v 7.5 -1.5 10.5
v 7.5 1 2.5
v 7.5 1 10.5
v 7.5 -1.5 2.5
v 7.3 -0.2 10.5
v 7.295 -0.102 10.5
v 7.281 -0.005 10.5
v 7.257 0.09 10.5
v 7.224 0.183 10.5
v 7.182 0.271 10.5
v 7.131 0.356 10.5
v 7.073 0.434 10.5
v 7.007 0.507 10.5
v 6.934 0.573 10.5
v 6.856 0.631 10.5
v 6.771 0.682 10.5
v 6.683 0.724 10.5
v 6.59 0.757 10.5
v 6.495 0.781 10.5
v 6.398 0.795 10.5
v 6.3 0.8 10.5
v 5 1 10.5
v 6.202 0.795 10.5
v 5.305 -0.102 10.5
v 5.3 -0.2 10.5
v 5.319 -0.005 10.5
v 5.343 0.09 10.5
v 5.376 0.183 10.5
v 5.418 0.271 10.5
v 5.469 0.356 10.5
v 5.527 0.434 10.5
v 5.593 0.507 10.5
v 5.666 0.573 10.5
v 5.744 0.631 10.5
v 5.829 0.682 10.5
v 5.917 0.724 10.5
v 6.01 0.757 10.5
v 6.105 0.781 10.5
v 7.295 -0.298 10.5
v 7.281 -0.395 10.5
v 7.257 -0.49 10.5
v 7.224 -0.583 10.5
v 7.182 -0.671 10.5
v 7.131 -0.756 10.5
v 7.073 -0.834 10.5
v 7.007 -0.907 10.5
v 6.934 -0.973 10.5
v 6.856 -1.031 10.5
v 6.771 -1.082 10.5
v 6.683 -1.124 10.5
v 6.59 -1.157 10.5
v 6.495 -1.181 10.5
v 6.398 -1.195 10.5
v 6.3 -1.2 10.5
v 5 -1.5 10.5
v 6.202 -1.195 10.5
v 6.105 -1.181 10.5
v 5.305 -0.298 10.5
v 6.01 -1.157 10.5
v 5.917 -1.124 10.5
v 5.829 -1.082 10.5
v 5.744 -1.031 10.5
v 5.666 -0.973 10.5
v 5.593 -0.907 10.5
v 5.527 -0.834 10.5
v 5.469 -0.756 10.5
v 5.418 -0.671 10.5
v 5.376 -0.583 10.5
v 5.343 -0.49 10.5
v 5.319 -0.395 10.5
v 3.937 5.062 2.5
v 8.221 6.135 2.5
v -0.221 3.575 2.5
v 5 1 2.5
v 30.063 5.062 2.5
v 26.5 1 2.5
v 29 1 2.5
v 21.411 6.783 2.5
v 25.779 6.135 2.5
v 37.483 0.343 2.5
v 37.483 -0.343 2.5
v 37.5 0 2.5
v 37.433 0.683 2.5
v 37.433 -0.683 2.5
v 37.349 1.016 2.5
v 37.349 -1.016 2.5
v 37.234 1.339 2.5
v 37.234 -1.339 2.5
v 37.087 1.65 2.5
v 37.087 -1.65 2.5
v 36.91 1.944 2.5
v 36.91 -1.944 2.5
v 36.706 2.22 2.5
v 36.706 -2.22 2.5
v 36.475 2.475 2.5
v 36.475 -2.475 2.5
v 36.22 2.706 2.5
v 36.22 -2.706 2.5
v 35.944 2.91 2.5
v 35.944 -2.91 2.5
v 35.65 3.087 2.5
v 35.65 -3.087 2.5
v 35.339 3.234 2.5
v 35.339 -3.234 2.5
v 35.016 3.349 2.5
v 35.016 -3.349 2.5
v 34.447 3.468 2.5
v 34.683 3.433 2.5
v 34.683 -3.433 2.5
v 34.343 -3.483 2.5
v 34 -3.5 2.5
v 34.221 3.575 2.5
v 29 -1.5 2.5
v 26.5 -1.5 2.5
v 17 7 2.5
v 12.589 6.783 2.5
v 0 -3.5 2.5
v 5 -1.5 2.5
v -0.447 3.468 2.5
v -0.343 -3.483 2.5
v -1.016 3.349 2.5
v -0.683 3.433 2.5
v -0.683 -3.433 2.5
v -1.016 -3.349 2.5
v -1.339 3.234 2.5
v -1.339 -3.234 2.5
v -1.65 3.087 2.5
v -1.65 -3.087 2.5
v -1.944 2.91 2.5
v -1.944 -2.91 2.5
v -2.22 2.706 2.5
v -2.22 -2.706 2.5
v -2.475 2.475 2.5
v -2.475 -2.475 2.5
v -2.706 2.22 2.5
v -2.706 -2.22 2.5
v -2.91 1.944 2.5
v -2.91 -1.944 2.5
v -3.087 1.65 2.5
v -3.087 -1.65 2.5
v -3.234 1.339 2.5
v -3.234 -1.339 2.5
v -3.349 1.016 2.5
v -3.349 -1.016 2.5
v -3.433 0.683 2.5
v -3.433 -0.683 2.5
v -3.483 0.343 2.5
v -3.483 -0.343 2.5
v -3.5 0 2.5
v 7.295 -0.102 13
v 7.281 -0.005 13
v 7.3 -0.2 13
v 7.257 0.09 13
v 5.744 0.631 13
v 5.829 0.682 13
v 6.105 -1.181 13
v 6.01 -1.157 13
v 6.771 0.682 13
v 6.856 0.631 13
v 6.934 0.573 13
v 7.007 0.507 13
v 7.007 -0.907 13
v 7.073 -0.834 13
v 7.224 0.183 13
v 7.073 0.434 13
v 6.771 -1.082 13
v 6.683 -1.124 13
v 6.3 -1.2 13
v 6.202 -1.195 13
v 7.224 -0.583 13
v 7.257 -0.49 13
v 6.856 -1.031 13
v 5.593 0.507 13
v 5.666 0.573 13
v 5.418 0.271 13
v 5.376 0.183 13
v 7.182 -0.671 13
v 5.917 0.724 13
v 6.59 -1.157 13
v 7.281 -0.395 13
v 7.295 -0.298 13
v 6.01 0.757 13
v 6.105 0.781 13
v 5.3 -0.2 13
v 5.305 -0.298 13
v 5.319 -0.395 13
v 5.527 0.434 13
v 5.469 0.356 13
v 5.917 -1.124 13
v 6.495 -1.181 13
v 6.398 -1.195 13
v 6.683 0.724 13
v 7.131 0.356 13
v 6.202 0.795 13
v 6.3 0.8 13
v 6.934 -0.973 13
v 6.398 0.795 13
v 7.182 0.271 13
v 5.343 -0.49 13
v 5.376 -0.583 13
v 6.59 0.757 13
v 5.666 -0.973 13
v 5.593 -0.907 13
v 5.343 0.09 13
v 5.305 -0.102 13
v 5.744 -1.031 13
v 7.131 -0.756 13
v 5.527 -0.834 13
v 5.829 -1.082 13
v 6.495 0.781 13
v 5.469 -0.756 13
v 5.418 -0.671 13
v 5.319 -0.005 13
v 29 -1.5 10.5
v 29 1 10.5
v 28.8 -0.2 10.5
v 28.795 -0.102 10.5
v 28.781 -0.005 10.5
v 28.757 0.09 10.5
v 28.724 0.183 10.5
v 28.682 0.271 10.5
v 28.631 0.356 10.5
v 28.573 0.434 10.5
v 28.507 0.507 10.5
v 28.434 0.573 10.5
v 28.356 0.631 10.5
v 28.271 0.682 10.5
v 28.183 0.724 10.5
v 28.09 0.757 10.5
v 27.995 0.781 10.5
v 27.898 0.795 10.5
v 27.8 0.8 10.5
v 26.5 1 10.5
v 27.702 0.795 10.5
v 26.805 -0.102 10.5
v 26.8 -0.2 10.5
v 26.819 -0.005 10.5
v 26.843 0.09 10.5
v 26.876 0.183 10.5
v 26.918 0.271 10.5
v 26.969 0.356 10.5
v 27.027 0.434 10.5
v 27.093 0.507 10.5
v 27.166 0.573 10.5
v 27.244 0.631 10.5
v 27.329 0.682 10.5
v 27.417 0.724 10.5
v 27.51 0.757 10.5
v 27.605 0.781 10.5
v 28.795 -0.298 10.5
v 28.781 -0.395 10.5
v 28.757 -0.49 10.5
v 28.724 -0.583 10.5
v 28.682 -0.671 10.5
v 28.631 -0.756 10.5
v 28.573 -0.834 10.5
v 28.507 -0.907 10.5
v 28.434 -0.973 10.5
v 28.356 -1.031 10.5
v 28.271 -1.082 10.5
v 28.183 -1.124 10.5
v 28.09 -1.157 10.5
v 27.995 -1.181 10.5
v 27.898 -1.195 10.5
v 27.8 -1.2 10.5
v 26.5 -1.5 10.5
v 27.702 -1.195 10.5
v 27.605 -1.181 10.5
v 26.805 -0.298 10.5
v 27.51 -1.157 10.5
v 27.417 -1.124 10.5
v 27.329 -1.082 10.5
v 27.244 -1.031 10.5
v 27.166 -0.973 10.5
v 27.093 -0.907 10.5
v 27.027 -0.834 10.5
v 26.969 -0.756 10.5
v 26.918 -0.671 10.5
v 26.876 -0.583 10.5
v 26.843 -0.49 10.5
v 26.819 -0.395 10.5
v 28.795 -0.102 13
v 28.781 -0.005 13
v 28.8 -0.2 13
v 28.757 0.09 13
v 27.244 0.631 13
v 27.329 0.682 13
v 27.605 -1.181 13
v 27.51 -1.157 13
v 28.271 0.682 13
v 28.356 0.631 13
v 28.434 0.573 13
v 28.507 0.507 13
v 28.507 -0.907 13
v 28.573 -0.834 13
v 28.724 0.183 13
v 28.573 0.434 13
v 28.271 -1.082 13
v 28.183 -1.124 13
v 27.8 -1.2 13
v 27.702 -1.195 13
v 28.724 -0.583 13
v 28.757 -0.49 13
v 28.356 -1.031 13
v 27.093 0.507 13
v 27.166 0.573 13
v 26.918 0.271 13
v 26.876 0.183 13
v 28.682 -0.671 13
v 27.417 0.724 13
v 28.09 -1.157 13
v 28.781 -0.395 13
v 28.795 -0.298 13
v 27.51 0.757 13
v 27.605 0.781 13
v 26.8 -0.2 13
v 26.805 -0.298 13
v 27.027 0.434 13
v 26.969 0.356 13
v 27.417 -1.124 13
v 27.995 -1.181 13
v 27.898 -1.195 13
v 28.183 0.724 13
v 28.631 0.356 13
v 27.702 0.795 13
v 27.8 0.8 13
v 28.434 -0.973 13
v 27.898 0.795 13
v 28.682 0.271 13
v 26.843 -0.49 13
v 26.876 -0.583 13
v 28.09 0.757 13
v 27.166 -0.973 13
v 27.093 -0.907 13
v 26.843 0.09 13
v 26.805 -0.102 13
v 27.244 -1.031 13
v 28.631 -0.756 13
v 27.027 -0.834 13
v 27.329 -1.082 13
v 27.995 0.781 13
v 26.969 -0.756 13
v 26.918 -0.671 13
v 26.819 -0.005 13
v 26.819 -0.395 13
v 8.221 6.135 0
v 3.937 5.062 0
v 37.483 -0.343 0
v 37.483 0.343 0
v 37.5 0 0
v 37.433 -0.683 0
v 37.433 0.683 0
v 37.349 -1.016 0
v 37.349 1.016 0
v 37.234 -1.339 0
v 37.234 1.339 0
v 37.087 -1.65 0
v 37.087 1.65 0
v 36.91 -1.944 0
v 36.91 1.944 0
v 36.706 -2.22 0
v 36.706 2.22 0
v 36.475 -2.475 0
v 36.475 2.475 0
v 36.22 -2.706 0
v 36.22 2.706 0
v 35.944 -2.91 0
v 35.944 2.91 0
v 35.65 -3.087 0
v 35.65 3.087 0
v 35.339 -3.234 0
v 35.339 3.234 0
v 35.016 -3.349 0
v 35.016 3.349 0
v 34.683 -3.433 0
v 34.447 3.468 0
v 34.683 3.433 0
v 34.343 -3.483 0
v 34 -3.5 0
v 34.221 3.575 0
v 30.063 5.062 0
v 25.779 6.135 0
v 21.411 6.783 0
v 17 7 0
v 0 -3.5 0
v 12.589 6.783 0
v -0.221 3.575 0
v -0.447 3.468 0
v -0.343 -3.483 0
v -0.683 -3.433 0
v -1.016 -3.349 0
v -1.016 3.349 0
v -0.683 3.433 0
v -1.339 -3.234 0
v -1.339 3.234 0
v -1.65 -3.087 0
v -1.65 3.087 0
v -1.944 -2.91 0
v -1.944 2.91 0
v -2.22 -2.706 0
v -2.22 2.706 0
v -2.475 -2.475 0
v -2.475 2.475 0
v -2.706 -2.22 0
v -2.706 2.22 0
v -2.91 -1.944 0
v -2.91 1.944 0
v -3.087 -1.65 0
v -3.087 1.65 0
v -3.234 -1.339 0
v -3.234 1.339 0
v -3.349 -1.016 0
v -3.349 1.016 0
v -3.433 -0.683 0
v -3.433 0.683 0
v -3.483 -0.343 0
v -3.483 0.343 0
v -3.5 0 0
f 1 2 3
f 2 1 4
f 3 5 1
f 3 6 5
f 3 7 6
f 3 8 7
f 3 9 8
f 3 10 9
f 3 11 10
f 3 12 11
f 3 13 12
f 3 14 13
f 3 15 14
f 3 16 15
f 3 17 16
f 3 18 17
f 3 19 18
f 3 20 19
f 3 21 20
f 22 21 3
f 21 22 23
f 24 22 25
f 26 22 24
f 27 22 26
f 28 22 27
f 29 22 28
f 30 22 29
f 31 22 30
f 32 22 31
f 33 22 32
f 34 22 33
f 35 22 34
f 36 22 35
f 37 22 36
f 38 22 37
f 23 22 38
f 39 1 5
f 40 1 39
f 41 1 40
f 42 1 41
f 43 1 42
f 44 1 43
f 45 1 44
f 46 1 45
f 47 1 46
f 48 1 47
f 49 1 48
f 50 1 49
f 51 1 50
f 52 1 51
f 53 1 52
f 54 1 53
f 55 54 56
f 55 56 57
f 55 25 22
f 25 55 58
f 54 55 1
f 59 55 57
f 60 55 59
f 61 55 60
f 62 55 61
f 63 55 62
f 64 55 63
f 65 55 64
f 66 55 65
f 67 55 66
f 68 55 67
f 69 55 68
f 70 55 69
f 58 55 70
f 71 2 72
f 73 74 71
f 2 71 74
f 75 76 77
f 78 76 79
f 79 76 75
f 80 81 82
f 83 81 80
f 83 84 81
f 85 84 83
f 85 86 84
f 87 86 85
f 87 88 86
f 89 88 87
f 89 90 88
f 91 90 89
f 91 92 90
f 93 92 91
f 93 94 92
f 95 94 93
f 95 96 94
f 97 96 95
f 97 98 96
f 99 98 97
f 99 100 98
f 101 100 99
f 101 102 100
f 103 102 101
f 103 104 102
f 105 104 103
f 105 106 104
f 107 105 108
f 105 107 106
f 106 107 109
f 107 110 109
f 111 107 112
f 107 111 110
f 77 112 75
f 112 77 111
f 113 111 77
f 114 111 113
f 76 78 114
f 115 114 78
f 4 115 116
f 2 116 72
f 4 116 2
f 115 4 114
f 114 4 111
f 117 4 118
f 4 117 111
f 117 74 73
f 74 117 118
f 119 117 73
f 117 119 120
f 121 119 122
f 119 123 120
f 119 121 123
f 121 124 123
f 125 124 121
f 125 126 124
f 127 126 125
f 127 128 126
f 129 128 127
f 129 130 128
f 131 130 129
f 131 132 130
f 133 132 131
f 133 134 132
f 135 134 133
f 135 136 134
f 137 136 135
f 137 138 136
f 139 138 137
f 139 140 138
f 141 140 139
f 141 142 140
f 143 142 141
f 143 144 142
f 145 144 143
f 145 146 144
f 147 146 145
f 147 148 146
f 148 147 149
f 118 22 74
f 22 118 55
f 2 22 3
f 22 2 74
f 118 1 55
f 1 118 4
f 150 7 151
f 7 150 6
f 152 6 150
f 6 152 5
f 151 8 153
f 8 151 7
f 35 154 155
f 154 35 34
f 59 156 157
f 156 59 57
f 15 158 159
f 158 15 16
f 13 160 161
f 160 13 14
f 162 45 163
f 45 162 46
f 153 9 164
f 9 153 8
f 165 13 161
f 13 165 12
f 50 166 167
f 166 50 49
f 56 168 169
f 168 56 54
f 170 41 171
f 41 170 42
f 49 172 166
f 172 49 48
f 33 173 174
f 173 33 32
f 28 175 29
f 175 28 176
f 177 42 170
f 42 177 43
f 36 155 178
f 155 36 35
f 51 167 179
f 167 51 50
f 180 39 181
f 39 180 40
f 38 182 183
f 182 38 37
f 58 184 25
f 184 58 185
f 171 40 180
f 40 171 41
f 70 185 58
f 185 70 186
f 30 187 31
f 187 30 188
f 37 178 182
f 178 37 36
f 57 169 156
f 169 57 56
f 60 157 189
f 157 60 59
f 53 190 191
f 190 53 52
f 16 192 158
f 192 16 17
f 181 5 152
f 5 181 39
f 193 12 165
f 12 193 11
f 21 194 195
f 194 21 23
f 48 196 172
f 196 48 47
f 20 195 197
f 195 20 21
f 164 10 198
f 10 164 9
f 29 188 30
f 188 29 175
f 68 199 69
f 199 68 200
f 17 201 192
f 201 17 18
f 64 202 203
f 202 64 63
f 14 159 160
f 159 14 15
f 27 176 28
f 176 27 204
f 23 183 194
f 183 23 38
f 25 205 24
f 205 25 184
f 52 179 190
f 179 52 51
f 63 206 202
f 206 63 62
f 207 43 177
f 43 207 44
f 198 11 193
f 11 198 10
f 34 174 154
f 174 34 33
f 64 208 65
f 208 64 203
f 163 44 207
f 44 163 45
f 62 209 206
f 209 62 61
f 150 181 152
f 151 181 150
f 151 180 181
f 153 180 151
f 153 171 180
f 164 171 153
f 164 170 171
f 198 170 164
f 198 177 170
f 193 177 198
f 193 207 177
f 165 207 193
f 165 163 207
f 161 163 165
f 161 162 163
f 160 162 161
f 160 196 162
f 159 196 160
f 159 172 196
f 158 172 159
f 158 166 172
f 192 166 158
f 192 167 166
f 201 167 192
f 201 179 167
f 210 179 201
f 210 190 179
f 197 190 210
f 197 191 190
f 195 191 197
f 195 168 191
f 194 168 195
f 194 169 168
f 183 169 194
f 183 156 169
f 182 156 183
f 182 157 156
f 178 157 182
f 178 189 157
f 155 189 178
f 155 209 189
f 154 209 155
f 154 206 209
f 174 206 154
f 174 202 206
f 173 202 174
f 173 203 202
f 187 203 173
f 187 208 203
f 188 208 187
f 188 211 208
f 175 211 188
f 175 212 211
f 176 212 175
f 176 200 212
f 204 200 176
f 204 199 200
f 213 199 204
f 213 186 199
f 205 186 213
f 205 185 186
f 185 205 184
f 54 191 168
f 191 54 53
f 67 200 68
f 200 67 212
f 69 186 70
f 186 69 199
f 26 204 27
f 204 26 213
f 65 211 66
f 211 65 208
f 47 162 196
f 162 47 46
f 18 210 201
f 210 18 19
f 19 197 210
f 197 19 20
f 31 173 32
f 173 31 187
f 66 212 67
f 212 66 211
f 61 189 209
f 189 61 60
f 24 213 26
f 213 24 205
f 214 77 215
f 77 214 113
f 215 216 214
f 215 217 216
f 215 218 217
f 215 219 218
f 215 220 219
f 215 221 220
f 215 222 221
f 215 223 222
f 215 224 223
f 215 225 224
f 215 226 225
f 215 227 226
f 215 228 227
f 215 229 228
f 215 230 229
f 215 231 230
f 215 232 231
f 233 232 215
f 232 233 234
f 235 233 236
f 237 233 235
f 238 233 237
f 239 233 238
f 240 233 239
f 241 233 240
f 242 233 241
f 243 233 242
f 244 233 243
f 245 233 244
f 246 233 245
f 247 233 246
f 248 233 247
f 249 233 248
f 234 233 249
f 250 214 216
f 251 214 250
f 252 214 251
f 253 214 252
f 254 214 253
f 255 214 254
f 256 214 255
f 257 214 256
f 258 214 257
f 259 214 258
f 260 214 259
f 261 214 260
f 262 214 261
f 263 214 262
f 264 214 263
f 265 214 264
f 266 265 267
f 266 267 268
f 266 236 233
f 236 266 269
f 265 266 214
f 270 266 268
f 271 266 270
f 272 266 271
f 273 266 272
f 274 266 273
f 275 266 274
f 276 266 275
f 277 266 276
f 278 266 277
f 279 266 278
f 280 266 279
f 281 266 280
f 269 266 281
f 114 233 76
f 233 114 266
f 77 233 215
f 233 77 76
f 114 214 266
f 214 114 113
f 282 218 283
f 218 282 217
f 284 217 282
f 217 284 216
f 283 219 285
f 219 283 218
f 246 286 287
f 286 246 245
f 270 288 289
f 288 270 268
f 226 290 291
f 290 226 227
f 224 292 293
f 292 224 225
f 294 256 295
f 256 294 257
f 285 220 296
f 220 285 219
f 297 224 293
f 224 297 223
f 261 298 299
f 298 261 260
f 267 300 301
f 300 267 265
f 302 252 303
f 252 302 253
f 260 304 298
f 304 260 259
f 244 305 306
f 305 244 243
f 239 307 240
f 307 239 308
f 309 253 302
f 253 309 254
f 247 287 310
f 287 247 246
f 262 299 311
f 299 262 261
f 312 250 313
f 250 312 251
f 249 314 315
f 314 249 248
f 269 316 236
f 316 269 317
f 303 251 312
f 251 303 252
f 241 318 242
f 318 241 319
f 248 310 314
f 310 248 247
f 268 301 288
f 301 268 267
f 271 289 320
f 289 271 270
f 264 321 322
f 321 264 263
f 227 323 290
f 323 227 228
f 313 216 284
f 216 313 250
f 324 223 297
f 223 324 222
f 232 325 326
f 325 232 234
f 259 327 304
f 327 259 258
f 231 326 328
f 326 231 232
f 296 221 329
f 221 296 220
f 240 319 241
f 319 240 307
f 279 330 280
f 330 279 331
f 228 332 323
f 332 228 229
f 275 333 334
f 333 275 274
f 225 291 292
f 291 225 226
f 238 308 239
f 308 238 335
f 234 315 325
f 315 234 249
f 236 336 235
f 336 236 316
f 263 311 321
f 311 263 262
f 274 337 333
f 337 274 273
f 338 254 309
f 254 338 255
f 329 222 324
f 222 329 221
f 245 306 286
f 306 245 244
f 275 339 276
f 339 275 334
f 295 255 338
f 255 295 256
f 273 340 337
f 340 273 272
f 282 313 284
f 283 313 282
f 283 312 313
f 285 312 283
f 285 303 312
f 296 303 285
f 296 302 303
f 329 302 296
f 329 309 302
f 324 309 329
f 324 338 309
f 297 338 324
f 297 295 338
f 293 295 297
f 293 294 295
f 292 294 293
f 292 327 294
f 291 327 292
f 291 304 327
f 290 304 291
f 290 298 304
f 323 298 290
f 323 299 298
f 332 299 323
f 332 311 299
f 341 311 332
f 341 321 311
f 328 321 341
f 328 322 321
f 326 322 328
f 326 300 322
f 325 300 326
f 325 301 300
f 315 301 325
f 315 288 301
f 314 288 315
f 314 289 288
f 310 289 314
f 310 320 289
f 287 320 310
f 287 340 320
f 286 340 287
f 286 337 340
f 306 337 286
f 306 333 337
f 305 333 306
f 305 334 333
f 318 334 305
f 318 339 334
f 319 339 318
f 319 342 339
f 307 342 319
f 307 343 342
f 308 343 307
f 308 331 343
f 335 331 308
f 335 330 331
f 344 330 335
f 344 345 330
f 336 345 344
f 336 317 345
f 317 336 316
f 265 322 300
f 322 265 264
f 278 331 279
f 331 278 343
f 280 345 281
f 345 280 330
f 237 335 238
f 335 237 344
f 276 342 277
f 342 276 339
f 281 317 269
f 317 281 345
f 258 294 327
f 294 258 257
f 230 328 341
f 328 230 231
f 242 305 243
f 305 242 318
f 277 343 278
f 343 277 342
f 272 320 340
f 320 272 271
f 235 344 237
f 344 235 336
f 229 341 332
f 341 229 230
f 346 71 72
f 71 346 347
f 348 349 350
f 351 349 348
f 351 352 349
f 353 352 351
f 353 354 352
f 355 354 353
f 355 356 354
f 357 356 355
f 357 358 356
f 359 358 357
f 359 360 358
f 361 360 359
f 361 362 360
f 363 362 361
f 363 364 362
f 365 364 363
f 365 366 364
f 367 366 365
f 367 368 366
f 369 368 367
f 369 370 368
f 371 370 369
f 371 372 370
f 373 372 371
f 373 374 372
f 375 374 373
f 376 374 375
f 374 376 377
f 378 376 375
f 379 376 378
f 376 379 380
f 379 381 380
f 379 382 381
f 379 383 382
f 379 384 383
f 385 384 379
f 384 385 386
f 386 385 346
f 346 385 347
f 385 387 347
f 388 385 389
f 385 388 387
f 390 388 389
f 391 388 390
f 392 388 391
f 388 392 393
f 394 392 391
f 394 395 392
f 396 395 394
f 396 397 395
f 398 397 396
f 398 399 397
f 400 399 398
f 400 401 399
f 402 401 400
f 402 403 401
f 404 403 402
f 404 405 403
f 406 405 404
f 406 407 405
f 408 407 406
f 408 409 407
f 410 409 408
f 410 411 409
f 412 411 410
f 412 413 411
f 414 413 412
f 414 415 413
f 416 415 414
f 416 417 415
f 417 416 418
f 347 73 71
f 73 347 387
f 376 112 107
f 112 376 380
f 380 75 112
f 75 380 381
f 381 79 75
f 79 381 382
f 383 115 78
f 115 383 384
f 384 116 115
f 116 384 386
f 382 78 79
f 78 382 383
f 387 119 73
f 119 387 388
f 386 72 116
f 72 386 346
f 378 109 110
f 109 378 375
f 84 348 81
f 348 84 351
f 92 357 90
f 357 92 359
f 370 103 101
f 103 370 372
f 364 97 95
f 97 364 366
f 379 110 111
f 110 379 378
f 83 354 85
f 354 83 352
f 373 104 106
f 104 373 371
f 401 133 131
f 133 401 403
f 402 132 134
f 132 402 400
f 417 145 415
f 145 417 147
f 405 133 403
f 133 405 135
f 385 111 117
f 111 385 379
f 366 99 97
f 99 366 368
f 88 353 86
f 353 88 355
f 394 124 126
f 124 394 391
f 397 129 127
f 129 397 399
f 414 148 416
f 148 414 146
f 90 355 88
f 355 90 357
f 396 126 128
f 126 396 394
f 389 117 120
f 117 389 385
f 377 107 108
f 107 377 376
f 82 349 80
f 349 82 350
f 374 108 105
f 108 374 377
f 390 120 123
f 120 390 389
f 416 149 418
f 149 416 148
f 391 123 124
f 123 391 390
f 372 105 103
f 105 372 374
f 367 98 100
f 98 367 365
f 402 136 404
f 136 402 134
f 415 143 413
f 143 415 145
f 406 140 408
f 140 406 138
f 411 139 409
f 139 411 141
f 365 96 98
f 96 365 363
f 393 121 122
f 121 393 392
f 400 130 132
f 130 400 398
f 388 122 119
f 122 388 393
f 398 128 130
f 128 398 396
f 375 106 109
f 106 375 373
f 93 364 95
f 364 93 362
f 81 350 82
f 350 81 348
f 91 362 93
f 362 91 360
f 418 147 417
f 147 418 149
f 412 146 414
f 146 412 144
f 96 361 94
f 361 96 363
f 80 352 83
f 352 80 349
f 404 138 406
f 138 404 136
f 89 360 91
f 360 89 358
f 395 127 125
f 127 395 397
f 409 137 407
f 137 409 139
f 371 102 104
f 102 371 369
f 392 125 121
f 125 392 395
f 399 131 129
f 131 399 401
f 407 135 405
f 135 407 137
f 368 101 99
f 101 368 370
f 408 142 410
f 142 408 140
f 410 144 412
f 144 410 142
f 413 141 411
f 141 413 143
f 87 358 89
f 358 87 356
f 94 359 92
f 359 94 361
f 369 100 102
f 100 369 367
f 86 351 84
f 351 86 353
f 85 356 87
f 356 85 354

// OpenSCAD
height=2.5;

$fn=$preview?8:64;
big_r=45;
r=3.5;
pinneskip=5;
firkantpinne_h=8;
firkantpinne_s=2.5;

hull() {
    cylinder(r=r, h=height);
    translate([34,0,0])
        cylinder(r=r, h=height);
}
translate([pinneskip,-1.5,height]) {
    cube([firkantpinne_s,firkantpinne_s,firkantpinne_h]);
    translate([1.3,1.3,firkantpinne_h]) {
        cylinder(h=2.5,r=1);
    }
}
translate([34-pinneskip-firkantpinne_s,-1.5,height]) {
    cube([firkantpinne_s,firkantpinne_s,firkantpinne_h]);
    translate([1.3,1.3,firkantpinne_h]) {
        cylinder(h=2.5,r=1);
    }
}
translate([17,-big_r+7,0]) {
    difference() {
        cylinder(r=big_r, h=height);
        translate([-big_r,-big_r,0]) {
            cube([big_r*2,big_r*2-4,height]);
        }
    }
}
